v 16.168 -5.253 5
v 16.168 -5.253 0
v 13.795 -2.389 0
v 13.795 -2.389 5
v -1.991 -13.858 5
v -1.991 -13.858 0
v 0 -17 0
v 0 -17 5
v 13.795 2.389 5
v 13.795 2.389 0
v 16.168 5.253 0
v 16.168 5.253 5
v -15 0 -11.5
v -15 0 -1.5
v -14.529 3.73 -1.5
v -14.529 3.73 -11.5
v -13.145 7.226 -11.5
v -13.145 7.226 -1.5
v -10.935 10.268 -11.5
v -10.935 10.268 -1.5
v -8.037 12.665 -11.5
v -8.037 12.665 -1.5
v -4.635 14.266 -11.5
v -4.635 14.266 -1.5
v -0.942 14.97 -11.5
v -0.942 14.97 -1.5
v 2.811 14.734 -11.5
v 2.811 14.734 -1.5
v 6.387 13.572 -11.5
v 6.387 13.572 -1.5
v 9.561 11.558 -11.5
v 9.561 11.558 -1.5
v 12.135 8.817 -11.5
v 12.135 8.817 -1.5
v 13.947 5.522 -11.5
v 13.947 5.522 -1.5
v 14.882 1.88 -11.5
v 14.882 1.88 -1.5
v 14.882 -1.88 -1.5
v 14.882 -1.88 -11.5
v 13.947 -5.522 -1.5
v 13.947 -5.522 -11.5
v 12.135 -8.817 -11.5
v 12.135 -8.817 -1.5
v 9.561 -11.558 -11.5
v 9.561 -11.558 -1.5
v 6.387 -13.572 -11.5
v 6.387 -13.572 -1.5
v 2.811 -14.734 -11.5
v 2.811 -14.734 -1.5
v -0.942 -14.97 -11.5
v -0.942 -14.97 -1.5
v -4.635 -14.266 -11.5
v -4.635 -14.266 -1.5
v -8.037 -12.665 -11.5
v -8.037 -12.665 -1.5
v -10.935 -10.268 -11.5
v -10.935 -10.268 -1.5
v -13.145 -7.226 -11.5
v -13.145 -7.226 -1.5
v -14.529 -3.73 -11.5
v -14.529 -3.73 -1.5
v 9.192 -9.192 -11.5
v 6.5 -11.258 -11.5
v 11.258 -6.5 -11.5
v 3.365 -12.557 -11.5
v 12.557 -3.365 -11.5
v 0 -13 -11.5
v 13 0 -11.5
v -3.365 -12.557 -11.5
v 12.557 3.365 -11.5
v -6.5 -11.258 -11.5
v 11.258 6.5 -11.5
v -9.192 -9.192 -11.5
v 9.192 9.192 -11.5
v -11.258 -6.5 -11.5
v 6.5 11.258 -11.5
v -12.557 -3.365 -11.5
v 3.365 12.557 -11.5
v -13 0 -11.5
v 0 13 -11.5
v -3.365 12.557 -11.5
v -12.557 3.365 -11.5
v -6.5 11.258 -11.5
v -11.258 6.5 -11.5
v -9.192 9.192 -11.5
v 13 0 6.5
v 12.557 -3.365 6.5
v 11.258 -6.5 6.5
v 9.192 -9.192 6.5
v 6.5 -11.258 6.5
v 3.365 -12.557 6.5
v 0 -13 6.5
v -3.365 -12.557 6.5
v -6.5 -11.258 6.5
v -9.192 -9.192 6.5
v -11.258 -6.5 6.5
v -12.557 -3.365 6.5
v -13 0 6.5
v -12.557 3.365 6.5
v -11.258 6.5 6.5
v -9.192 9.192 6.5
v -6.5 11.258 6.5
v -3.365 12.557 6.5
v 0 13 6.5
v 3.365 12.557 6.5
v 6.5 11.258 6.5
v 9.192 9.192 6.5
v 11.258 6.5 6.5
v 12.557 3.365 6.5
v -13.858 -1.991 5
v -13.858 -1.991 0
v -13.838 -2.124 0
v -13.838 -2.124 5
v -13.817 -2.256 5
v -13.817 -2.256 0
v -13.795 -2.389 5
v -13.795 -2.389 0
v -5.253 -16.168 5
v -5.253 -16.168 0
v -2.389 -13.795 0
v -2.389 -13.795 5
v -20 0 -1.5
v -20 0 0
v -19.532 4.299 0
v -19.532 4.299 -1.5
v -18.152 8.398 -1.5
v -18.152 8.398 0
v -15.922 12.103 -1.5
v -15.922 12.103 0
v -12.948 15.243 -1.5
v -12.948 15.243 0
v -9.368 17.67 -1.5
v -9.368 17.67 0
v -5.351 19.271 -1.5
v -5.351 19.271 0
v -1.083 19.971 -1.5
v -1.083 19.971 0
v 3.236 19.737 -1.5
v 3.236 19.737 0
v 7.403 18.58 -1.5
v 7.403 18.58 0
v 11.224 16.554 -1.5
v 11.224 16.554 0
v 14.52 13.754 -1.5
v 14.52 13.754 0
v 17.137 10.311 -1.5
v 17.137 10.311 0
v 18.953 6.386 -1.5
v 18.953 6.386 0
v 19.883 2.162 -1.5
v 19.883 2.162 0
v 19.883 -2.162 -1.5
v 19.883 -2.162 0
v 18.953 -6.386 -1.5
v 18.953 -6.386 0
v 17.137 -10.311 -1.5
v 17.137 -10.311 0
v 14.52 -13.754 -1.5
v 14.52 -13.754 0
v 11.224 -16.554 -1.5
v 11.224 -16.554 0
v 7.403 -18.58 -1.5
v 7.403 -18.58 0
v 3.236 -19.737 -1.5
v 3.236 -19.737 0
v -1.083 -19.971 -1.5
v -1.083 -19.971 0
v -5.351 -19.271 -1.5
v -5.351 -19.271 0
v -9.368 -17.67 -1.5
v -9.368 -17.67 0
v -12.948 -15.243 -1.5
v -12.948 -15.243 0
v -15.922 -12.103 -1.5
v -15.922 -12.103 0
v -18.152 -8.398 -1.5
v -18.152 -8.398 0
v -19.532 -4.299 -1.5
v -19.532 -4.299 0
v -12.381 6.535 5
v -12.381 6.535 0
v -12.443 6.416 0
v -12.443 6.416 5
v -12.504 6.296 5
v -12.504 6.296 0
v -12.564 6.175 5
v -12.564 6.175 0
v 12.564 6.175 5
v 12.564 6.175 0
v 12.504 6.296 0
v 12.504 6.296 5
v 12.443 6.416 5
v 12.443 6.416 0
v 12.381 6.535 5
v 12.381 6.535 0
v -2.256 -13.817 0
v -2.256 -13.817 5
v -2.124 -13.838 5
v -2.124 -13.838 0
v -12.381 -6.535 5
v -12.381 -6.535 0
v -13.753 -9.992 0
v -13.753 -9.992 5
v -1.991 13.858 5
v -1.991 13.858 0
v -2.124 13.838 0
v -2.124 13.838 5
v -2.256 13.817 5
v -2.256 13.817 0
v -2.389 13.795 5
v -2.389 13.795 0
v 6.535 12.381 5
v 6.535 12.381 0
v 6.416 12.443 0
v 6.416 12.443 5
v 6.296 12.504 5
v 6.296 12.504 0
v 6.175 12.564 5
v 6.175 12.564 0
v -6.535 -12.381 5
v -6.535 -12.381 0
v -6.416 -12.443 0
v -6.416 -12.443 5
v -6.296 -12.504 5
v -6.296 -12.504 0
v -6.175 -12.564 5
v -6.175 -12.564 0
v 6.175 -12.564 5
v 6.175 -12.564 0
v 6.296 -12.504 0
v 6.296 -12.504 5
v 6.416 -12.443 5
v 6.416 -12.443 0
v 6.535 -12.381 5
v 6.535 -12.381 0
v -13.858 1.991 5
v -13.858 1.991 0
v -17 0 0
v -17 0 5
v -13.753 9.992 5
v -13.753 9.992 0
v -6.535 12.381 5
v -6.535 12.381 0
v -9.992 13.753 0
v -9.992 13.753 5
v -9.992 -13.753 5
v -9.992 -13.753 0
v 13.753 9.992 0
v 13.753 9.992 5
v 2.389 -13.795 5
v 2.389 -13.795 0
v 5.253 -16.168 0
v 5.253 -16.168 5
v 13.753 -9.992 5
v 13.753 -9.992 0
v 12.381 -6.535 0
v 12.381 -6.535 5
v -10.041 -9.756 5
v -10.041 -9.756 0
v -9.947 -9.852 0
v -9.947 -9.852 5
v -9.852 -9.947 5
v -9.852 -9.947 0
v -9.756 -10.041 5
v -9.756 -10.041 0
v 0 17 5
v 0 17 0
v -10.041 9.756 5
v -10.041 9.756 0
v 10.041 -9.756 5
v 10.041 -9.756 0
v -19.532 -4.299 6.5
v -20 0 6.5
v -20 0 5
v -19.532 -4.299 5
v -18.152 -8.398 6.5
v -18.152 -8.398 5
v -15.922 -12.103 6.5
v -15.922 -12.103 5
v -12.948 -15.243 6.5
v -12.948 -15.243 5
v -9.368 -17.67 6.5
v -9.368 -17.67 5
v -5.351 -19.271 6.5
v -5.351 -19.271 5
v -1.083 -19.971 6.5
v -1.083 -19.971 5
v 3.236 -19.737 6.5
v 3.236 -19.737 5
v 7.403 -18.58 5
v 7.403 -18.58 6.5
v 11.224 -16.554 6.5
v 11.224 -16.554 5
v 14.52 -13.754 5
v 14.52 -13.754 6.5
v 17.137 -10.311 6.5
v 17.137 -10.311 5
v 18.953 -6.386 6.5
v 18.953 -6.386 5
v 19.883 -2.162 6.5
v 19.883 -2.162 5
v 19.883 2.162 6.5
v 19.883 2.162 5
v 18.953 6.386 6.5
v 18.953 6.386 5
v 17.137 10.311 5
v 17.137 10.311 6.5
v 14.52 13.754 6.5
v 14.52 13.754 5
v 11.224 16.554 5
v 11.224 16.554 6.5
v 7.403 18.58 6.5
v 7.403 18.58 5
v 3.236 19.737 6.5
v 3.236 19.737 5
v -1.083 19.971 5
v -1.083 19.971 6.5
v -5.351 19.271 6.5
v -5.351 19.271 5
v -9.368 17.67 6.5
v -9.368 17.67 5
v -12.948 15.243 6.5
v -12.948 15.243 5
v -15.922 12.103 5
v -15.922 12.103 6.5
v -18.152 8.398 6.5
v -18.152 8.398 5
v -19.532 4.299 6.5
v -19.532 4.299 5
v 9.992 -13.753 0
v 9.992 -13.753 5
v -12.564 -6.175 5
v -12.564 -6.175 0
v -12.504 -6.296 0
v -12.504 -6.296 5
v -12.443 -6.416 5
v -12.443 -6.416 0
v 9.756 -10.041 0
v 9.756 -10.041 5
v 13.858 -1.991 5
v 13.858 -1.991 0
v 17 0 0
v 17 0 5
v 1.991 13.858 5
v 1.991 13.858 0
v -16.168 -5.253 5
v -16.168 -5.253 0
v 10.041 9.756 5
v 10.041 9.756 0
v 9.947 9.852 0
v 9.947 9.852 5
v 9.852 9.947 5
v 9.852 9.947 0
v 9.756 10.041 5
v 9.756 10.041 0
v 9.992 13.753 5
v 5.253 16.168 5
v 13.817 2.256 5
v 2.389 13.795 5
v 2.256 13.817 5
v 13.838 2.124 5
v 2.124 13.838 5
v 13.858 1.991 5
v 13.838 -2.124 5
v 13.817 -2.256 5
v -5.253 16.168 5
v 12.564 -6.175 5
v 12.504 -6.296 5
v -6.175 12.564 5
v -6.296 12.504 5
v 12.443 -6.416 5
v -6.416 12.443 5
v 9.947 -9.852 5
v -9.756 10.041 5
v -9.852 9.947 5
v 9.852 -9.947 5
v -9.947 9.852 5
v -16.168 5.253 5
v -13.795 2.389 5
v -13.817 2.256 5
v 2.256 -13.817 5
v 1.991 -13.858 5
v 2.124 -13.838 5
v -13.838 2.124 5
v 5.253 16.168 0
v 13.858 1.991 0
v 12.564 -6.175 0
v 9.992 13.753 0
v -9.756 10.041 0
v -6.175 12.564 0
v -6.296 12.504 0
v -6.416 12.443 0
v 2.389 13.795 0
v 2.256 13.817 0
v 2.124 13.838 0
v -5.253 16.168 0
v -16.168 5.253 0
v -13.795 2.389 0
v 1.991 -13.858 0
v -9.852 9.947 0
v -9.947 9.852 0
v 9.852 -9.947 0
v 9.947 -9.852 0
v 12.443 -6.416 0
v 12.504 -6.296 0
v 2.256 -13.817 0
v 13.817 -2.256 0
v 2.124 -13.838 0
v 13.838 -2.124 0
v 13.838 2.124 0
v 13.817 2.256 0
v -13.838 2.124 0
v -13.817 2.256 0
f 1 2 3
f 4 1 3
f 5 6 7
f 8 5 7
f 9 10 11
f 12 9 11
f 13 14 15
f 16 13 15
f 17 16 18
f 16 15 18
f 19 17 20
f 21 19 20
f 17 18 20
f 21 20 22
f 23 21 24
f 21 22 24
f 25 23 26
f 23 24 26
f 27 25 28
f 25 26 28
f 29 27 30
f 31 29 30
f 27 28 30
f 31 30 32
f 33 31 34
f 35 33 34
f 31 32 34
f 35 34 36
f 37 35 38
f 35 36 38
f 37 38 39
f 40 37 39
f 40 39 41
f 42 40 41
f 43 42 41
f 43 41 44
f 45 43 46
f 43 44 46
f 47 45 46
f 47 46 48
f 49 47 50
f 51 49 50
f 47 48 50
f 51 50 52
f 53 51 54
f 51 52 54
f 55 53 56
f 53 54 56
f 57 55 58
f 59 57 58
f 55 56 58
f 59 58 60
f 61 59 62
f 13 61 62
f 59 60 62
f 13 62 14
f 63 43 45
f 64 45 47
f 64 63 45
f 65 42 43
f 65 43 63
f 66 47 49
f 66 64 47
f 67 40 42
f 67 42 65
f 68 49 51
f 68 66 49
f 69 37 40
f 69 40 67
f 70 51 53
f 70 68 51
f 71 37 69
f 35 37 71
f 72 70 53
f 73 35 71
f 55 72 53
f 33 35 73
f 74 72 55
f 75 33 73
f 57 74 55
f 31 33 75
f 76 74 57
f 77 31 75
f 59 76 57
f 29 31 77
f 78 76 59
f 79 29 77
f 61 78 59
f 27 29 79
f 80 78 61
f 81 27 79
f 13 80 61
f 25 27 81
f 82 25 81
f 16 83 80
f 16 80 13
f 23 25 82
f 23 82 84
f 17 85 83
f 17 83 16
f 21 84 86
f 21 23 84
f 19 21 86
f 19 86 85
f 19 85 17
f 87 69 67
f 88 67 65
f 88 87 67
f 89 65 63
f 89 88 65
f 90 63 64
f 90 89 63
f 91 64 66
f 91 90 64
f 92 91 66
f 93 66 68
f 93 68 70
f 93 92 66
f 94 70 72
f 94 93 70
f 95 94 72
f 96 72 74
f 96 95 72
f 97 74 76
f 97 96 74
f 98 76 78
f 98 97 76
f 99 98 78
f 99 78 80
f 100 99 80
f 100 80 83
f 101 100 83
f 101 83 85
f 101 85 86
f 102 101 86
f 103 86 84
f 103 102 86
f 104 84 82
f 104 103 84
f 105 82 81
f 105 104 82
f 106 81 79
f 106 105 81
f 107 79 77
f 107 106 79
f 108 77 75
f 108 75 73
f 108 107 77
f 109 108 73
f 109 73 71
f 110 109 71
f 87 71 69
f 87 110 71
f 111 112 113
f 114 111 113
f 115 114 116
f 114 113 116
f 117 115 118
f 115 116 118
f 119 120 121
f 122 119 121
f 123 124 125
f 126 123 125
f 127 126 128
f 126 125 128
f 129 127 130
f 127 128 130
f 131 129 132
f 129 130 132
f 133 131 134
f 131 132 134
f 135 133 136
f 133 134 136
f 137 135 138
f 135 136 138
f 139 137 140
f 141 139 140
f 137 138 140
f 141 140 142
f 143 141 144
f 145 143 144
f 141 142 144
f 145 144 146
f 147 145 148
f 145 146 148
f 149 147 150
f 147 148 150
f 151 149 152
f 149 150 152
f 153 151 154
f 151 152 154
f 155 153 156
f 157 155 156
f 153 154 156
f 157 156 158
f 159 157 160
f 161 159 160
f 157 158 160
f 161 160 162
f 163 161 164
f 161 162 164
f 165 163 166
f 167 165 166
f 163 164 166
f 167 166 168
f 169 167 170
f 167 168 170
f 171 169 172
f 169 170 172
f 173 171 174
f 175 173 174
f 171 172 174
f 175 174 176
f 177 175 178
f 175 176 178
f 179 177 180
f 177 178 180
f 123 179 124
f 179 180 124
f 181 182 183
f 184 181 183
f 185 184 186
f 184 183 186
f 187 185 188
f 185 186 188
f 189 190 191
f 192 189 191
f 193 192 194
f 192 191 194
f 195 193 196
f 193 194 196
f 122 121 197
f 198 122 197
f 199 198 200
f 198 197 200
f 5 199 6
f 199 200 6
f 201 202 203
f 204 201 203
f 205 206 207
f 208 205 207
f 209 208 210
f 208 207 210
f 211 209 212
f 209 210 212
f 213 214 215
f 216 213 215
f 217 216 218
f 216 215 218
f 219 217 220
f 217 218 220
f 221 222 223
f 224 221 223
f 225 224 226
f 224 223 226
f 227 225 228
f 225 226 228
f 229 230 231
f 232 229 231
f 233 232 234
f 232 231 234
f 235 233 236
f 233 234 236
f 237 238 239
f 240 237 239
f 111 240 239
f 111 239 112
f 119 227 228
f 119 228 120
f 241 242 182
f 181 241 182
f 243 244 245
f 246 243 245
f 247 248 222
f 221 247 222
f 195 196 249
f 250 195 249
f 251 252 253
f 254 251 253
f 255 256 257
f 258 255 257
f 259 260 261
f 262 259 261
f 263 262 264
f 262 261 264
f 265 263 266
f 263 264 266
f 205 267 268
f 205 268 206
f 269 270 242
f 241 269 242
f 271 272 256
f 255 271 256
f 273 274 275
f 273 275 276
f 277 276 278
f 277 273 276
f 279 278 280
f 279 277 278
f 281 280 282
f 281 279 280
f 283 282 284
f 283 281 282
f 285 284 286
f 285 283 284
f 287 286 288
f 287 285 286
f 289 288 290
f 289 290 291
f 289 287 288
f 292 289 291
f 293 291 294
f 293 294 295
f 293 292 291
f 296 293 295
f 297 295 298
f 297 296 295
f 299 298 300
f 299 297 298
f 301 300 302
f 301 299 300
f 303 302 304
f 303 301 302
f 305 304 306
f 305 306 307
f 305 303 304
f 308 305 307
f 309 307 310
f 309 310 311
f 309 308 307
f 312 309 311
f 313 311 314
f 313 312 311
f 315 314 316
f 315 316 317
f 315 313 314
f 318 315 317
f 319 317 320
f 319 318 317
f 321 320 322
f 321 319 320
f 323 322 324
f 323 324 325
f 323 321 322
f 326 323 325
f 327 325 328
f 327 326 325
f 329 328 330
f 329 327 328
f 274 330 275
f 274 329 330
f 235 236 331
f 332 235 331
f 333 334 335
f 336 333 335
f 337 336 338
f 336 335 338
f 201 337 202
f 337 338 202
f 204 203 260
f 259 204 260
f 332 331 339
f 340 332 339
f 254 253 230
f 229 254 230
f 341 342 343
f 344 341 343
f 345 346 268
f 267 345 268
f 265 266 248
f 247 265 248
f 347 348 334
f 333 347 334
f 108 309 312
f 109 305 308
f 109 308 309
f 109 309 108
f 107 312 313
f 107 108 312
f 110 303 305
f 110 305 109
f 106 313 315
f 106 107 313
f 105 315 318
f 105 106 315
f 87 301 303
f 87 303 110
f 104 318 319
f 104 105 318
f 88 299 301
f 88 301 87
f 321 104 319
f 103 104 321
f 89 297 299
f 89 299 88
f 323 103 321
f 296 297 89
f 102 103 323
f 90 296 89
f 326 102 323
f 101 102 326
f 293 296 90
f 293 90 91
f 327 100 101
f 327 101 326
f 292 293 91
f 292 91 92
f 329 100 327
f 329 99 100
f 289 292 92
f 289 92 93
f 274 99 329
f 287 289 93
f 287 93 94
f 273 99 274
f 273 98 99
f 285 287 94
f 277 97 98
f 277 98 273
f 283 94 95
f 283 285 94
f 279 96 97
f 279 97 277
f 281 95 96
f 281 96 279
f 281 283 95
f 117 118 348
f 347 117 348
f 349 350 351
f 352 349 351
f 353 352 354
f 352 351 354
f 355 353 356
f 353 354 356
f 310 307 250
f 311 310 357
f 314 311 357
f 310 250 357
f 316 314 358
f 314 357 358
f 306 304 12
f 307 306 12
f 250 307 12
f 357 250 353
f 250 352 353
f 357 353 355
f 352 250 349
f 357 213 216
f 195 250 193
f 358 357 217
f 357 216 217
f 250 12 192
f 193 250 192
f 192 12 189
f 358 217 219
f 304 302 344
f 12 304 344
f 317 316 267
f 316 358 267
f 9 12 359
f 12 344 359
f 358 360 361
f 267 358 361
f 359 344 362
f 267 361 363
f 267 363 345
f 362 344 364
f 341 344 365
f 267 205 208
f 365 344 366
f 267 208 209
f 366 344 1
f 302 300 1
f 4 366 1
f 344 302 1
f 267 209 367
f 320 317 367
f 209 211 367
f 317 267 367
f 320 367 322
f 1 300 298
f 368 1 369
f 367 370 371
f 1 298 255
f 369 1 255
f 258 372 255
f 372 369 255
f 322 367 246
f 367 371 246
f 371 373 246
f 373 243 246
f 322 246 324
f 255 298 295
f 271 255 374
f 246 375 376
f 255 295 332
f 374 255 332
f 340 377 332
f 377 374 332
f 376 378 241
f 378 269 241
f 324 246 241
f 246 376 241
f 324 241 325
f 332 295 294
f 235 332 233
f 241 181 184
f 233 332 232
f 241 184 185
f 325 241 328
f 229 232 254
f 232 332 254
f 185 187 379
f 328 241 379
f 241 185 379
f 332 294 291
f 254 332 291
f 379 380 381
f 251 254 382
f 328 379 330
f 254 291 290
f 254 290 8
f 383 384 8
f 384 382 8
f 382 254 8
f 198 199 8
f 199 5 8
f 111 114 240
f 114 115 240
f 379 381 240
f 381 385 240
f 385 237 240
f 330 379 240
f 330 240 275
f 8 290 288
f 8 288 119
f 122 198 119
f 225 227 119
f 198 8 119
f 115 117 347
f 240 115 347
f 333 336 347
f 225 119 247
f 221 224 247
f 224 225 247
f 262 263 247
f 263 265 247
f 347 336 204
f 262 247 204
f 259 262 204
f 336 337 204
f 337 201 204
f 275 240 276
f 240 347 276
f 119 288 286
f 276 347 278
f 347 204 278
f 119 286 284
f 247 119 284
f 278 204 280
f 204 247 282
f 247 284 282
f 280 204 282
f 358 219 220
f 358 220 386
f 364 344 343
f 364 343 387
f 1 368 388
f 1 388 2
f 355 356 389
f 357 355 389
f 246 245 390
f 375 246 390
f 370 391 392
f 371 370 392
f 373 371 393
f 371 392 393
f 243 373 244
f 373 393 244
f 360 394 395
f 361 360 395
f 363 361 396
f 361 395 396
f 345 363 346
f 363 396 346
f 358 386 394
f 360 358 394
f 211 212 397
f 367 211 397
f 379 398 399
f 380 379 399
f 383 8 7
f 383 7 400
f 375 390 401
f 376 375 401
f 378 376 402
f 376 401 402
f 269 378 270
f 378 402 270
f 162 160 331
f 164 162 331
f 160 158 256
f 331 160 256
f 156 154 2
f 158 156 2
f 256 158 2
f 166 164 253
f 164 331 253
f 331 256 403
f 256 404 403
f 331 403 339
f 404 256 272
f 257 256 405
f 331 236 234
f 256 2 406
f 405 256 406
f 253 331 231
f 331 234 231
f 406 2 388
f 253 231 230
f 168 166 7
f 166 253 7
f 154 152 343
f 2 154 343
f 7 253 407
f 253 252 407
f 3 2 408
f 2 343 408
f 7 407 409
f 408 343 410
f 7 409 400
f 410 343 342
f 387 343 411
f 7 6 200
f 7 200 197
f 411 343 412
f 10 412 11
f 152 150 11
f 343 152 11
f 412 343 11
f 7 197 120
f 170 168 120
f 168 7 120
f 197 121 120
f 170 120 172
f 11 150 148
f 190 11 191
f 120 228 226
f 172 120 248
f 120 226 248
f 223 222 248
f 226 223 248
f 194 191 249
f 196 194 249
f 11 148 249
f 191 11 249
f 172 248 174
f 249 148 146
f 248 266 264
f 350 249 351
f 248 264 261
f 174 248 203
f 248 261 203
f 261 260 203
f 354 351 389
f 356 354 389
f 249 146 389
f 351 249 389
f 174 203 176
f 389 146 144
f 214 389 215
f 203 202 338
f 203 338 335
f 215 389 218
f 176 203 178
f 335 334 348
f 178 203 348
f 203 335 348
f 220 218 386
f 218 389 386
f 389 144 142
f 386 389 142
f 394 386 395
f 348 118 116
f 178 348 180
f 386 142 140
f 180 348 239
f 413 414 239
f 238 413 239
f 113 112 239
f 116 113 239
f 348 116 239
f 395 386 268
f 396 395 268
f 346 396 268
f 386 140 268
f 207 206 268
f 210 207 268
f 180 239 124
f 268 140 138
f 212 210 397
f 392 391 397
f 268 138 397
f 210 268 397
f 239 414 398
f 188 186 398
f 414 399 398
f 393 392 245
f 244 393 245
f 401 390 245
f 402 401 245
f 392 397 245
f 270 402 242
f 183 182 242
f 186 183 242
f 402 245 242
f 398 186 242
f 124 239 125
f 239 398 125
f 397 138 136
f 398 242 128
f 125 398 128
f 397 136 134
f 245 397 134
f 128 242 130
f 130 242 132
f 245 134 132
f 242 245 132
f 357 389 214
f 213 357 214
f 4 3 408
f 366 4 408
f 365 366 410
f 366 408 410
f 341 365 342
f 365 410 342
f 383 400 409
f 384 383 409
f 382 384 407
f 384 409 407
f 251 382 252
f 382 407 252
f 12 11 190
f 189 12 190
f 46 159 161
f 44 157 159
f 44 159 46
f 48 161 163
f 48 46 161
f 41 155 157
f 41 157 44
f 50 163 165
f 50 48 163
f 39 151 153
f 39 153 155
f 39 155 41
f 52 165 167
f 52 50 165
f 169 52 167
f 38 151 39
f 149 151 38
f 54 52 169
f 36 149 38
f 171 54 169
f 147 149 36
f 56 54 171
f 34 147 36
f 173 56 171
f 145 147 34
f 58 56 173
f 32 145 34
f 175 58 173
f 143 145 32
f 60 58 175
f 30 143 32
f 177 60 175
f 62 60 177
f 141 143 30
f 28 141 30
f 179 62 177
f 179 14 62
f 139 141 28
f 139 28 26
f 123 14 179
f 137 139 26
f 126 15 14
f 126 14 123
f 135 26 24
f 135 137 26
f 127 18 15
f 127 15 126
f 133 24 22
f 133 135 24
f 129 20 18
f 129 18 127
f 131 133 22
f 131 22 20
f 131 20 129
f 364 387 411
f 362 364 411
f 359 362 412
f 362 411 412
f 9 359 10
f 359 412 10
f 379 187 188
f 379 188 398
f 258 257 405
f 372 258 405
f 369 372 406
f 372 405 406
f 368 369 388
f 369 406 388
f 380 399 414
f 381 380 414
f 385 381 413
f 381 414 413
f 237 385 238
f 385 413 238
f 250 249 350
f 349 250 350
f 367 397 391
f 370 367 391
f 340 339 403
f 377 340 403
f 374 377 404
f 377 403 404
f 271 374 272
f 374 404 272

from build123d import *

# Parameters (mm, degrees)
BOSS_EXTRUDE1_DEPTH = 5
SKETCH2_R           = 20
BOSS_EXTRUDE2_DEPTH = 1.5
BOSS_EXTRUDE3_START = 1.5
SKETCH3_R           = 20
BOSS_EXTRUDE3_DEPTH = 1.5
SKETCH4_R           = 13
CUT_EXTRUDE1_DEPTH  = 11.5
SKETCH5_R           = 15
BOSS_EXTRUDE4_DEPTH = 10
CUT_EXTRUDE2_START  = -30
SKETCH6_R           = 13
CUT_EXTRUDE2_DEPTH  = 30


with BuildPart() as part:
    # Sketch1 → Boss-Extrude1 (new body)
    with BuildSketch(Plane.XY):
        with BuildLine():
            Line((0, 17), (-1.990617103, 13.857757522))
            ThreePointArc((-1.990617103, 13.857757522), (-2.190082511, 13.827636768), (-2.389093211, 13.794645107))
            Line((-2.389093211, 13.794645107), (-5.253288904, 16.167960777))
            Line((-5.253288904, 16.167960777), (-6.175471945, 12.564376079))
            ThreePointArc((-6.175471945, 12.564376079), (-6.355866996, 12.474091339), (-6.534942436, 12.381216715))
            Line((-6.534942436, 12.381216715), (-9.992349289, 13.753288904))
            Line((-9.992349289, 13.753288904), (-9.755828567, 10.041105964))
            ThreePointArc((-9.755828567, 10.041105964), (-9.899494937, 9.899494937), (-10.041105964, 9.755828567))
            Line((-10.041105964, 9.755828567), (-13.753288904, 9.992349289))
            Line((-13.753288904, 9.992349289), (-12.381216715, 6.534942436))
            ThreePointArc((-12.381216715, 6.534942436), (-12.474091339, 6.355866996), (-12.564376079, 6.175471945))
            Line((-12.564376079, 6.175471945), (-16.167960777, 5.253288904))
            Line((-16.167960777, 5.253288904), (-13.794645107, 2.389093211))
            ThreePointArc((-13.794645107, 2.389093211), (-13.827636768, 2.190082511), (-13.857757522, 1.990617103))
            Line((-13.857757522, 1.990617103), (-17, 0))
            Line((-17, 0), (-13.857757522, -1.990617103))
            ThreePointArc((-13.857757522, -1.990617103), (-13.827636768, -2.190082511), (-13.794645107, -2.389093211))
            Line((-13.794645107, -2.389093211), (-16.167960777, -5.253288904))
            Line((-16.167960777, -5.253288904), (-12.564376079, -6.175471945))
            ThreePointArc((-12.564376079, -6.175471945), (-12.474091339, -6.355866996), (-12.381216715, -6.534942436))
            Line((-12.381216715, -6.534942436), (-13.753288904, -9.992349289))
            Line((-13.753288904, -9.992349289), (-10.041105964, -9.755828567))
            ThreePointArc((-10.041105964, -9.755828567), (-9.899494937, -9.899494937), (-9.755828567, -10.041105964))
            Line((-9.755828567, -10.041105964), (-9.992349289, -13.753288904))
            Line((-9.992349289, -13.753288904), (-6.534942436, -12.381216715))
            ThreePointArc((-6.534942436, -12.381216715), (-6.355866996, -12.474091339), (-6.175471945, -12.564376079))
            Line((-6.175471945, -12.564376079), (-5.253288904, -16.167960777))
            Line((-5.253288904, -16.167960777), (-2.389093211, -13.794645107))
            ThreePointArc((-2.389093211, -13.794645107), (-2.190082511, -13.827636768), (-1.990617103, -13.857757522))
            Line((-1.990617103, -13.857757522), (0, -17))
            Line((0, -17), (1.990617103, -13.857757522))
            ThreePointArc((1.990617103, -13.857757522), (2.190082511, -13.827636768), (2.389093211, -13.794645107))
            Line((2.389093211, -13.794645107), (5.253288904, -16.167960777))
            Line((5.253288904, -16.167960777), (6.175471945, -12.564376079))
            ThreePointArc((6.175471945, -12.564376079), (6.355866996, -12.474091339), (6.534942436, -12.381216715))
            Line((6.534942436, -12.381216715), (9.992349289, -13.753288904))
            Line((9.992349289, -13.753288904), (9.755828567, -10.041105964))
            ThreePointArc((9.755828567, -10.041105964), (9.899494937, -9.899494937), (10.041105964, -9.755828567))
            Line((10.041105964, -9.755828567), (13.753288904, -9.992349289))
            Line((13.753288904, -9.992349289), (12.381216715, -6.534942436))
            ThreePointArc((12.381216715, -6.534942436), (12.474091339, -6.355866996), (12.564376079, -6.175471945))
            Line((12.564376079, -6.175471945), (16.167960777, -5.253288904))
            Line((16.167960777, -5.253288904), (13.794645107, -2.389093211))
            ThreePointArc((13.794645107, -2.389093211), (13.827636768, -2.190082511), (13.857757522, -1.990617103))
            Line((13.857757522, -1.990617103), (17, 0))
            Line((17, 0), (13.857757522, 1.990617103))
            ThreePointArc((13.857757522, 1.990617103), (13.827636768, 2.190082511), (13.794645107, 2.389093211))
            Line((13.794645107, 2.389093211), (16.167960777, 5.253288904))
            Line((16.167960777, 5.253288904), (12.564376079, 6.175471945))
            ThreePointArc((12.564376079, 6.175471945), (12.474091339, 6.355866996), (12.381216715, 6.534942436))
            Line((12.381216715, 6.534942436), (13.753288904, 9.992349289))
            Line((13.753288904, 9.992349289), (10.041105964, 9.755828567))
            ThreePointArc((10.041105964, 9.755828567), (9.899494937, 9.899494937), (9.755828567, 10.041105964))
            Line((9.755828567, 10.041105964), (9.992349289, 13.753288904))
            Line((9.992349289, 13.753288904), (6.534942436, 12.381216715))
            ThreePointArc((6.534942436, 12.381216715), (6.355866996, 12.474091339), (6.175471945, 12.564376079))
            Line((6.175471945, 12.564376079), (5.253288904, 16.167960777))
            Line((5.253288904, 16.167960777), (2.389093211, 13.794645107))
            ThreePointArc((2.389093211, 13.794645107), (2.190082511, 13.827636768), (1.990617103, 13.857757522))
            Line((1.990617103, 13.857757522), (0, 17))
        make_face()
    extrude(amount=BOSS_EXTRUDE1_DEPTH)

    # Sketch2 → Boss-Extrude2 (add)
    with BuildSketch(Plane(origin=(0, 0, 0), x_dir=(-1, 0, 0), z_dir=(0, 0, -1))):
        Circle(SKETCH2_R)
    extrude(amount=BOSS_EXTRUDE2_DEPTH)

    # Sketch3 → Boss-Extrude3 (add)
    with BuildSketch(Plane.XY.offset(5).offset(BOSS_EXTRUDE3_START)):
        with Locations(Location((0, 0, 0), (0, 0, 180))):
            Circle(SKETCH3_R)
    extrude(amount=-BOSS_EXTRUDE3_DEPTH)

    # Sketch4 → Cut-Extrude1 (cut)
    with BuildSketch(Plane.XY.offset(6.5)):
        Circle(SKETCH4_R)
    extrude(amount=-CUT_EXTRUDE1_DEPTH, mode=Mode.SUBTRACT)

    # Sketch5 → Boss-Extrude4 (add)
    with BuildSketch(Plane(origin=(0, 0, -1.5), x_dir=(-1, 0, 0), z_dir=(0, 0, -1))):
        Circle(SKETCH5_R)
    extrude(amount=BOSS_EXTRUDE4_DEPTH)

    # Sketch6 → Cut-Extrude2 (cut)
    with BuildSketch(Plane(origin=(0, 0, -11.5), x_dir=(-1, 0, 0), z_dir=(0, 0, -1)).offset(CUT_EXTRUDE2_START)):
        with Locations(Location((0, 0, 0), (0, 0, 180))):
            Circle(SKETCH6_R)
    extrude(amount=CUT_EXTRUDE2_DEPTH, mode=Mode.SUBTRACT)


solid = part.part
